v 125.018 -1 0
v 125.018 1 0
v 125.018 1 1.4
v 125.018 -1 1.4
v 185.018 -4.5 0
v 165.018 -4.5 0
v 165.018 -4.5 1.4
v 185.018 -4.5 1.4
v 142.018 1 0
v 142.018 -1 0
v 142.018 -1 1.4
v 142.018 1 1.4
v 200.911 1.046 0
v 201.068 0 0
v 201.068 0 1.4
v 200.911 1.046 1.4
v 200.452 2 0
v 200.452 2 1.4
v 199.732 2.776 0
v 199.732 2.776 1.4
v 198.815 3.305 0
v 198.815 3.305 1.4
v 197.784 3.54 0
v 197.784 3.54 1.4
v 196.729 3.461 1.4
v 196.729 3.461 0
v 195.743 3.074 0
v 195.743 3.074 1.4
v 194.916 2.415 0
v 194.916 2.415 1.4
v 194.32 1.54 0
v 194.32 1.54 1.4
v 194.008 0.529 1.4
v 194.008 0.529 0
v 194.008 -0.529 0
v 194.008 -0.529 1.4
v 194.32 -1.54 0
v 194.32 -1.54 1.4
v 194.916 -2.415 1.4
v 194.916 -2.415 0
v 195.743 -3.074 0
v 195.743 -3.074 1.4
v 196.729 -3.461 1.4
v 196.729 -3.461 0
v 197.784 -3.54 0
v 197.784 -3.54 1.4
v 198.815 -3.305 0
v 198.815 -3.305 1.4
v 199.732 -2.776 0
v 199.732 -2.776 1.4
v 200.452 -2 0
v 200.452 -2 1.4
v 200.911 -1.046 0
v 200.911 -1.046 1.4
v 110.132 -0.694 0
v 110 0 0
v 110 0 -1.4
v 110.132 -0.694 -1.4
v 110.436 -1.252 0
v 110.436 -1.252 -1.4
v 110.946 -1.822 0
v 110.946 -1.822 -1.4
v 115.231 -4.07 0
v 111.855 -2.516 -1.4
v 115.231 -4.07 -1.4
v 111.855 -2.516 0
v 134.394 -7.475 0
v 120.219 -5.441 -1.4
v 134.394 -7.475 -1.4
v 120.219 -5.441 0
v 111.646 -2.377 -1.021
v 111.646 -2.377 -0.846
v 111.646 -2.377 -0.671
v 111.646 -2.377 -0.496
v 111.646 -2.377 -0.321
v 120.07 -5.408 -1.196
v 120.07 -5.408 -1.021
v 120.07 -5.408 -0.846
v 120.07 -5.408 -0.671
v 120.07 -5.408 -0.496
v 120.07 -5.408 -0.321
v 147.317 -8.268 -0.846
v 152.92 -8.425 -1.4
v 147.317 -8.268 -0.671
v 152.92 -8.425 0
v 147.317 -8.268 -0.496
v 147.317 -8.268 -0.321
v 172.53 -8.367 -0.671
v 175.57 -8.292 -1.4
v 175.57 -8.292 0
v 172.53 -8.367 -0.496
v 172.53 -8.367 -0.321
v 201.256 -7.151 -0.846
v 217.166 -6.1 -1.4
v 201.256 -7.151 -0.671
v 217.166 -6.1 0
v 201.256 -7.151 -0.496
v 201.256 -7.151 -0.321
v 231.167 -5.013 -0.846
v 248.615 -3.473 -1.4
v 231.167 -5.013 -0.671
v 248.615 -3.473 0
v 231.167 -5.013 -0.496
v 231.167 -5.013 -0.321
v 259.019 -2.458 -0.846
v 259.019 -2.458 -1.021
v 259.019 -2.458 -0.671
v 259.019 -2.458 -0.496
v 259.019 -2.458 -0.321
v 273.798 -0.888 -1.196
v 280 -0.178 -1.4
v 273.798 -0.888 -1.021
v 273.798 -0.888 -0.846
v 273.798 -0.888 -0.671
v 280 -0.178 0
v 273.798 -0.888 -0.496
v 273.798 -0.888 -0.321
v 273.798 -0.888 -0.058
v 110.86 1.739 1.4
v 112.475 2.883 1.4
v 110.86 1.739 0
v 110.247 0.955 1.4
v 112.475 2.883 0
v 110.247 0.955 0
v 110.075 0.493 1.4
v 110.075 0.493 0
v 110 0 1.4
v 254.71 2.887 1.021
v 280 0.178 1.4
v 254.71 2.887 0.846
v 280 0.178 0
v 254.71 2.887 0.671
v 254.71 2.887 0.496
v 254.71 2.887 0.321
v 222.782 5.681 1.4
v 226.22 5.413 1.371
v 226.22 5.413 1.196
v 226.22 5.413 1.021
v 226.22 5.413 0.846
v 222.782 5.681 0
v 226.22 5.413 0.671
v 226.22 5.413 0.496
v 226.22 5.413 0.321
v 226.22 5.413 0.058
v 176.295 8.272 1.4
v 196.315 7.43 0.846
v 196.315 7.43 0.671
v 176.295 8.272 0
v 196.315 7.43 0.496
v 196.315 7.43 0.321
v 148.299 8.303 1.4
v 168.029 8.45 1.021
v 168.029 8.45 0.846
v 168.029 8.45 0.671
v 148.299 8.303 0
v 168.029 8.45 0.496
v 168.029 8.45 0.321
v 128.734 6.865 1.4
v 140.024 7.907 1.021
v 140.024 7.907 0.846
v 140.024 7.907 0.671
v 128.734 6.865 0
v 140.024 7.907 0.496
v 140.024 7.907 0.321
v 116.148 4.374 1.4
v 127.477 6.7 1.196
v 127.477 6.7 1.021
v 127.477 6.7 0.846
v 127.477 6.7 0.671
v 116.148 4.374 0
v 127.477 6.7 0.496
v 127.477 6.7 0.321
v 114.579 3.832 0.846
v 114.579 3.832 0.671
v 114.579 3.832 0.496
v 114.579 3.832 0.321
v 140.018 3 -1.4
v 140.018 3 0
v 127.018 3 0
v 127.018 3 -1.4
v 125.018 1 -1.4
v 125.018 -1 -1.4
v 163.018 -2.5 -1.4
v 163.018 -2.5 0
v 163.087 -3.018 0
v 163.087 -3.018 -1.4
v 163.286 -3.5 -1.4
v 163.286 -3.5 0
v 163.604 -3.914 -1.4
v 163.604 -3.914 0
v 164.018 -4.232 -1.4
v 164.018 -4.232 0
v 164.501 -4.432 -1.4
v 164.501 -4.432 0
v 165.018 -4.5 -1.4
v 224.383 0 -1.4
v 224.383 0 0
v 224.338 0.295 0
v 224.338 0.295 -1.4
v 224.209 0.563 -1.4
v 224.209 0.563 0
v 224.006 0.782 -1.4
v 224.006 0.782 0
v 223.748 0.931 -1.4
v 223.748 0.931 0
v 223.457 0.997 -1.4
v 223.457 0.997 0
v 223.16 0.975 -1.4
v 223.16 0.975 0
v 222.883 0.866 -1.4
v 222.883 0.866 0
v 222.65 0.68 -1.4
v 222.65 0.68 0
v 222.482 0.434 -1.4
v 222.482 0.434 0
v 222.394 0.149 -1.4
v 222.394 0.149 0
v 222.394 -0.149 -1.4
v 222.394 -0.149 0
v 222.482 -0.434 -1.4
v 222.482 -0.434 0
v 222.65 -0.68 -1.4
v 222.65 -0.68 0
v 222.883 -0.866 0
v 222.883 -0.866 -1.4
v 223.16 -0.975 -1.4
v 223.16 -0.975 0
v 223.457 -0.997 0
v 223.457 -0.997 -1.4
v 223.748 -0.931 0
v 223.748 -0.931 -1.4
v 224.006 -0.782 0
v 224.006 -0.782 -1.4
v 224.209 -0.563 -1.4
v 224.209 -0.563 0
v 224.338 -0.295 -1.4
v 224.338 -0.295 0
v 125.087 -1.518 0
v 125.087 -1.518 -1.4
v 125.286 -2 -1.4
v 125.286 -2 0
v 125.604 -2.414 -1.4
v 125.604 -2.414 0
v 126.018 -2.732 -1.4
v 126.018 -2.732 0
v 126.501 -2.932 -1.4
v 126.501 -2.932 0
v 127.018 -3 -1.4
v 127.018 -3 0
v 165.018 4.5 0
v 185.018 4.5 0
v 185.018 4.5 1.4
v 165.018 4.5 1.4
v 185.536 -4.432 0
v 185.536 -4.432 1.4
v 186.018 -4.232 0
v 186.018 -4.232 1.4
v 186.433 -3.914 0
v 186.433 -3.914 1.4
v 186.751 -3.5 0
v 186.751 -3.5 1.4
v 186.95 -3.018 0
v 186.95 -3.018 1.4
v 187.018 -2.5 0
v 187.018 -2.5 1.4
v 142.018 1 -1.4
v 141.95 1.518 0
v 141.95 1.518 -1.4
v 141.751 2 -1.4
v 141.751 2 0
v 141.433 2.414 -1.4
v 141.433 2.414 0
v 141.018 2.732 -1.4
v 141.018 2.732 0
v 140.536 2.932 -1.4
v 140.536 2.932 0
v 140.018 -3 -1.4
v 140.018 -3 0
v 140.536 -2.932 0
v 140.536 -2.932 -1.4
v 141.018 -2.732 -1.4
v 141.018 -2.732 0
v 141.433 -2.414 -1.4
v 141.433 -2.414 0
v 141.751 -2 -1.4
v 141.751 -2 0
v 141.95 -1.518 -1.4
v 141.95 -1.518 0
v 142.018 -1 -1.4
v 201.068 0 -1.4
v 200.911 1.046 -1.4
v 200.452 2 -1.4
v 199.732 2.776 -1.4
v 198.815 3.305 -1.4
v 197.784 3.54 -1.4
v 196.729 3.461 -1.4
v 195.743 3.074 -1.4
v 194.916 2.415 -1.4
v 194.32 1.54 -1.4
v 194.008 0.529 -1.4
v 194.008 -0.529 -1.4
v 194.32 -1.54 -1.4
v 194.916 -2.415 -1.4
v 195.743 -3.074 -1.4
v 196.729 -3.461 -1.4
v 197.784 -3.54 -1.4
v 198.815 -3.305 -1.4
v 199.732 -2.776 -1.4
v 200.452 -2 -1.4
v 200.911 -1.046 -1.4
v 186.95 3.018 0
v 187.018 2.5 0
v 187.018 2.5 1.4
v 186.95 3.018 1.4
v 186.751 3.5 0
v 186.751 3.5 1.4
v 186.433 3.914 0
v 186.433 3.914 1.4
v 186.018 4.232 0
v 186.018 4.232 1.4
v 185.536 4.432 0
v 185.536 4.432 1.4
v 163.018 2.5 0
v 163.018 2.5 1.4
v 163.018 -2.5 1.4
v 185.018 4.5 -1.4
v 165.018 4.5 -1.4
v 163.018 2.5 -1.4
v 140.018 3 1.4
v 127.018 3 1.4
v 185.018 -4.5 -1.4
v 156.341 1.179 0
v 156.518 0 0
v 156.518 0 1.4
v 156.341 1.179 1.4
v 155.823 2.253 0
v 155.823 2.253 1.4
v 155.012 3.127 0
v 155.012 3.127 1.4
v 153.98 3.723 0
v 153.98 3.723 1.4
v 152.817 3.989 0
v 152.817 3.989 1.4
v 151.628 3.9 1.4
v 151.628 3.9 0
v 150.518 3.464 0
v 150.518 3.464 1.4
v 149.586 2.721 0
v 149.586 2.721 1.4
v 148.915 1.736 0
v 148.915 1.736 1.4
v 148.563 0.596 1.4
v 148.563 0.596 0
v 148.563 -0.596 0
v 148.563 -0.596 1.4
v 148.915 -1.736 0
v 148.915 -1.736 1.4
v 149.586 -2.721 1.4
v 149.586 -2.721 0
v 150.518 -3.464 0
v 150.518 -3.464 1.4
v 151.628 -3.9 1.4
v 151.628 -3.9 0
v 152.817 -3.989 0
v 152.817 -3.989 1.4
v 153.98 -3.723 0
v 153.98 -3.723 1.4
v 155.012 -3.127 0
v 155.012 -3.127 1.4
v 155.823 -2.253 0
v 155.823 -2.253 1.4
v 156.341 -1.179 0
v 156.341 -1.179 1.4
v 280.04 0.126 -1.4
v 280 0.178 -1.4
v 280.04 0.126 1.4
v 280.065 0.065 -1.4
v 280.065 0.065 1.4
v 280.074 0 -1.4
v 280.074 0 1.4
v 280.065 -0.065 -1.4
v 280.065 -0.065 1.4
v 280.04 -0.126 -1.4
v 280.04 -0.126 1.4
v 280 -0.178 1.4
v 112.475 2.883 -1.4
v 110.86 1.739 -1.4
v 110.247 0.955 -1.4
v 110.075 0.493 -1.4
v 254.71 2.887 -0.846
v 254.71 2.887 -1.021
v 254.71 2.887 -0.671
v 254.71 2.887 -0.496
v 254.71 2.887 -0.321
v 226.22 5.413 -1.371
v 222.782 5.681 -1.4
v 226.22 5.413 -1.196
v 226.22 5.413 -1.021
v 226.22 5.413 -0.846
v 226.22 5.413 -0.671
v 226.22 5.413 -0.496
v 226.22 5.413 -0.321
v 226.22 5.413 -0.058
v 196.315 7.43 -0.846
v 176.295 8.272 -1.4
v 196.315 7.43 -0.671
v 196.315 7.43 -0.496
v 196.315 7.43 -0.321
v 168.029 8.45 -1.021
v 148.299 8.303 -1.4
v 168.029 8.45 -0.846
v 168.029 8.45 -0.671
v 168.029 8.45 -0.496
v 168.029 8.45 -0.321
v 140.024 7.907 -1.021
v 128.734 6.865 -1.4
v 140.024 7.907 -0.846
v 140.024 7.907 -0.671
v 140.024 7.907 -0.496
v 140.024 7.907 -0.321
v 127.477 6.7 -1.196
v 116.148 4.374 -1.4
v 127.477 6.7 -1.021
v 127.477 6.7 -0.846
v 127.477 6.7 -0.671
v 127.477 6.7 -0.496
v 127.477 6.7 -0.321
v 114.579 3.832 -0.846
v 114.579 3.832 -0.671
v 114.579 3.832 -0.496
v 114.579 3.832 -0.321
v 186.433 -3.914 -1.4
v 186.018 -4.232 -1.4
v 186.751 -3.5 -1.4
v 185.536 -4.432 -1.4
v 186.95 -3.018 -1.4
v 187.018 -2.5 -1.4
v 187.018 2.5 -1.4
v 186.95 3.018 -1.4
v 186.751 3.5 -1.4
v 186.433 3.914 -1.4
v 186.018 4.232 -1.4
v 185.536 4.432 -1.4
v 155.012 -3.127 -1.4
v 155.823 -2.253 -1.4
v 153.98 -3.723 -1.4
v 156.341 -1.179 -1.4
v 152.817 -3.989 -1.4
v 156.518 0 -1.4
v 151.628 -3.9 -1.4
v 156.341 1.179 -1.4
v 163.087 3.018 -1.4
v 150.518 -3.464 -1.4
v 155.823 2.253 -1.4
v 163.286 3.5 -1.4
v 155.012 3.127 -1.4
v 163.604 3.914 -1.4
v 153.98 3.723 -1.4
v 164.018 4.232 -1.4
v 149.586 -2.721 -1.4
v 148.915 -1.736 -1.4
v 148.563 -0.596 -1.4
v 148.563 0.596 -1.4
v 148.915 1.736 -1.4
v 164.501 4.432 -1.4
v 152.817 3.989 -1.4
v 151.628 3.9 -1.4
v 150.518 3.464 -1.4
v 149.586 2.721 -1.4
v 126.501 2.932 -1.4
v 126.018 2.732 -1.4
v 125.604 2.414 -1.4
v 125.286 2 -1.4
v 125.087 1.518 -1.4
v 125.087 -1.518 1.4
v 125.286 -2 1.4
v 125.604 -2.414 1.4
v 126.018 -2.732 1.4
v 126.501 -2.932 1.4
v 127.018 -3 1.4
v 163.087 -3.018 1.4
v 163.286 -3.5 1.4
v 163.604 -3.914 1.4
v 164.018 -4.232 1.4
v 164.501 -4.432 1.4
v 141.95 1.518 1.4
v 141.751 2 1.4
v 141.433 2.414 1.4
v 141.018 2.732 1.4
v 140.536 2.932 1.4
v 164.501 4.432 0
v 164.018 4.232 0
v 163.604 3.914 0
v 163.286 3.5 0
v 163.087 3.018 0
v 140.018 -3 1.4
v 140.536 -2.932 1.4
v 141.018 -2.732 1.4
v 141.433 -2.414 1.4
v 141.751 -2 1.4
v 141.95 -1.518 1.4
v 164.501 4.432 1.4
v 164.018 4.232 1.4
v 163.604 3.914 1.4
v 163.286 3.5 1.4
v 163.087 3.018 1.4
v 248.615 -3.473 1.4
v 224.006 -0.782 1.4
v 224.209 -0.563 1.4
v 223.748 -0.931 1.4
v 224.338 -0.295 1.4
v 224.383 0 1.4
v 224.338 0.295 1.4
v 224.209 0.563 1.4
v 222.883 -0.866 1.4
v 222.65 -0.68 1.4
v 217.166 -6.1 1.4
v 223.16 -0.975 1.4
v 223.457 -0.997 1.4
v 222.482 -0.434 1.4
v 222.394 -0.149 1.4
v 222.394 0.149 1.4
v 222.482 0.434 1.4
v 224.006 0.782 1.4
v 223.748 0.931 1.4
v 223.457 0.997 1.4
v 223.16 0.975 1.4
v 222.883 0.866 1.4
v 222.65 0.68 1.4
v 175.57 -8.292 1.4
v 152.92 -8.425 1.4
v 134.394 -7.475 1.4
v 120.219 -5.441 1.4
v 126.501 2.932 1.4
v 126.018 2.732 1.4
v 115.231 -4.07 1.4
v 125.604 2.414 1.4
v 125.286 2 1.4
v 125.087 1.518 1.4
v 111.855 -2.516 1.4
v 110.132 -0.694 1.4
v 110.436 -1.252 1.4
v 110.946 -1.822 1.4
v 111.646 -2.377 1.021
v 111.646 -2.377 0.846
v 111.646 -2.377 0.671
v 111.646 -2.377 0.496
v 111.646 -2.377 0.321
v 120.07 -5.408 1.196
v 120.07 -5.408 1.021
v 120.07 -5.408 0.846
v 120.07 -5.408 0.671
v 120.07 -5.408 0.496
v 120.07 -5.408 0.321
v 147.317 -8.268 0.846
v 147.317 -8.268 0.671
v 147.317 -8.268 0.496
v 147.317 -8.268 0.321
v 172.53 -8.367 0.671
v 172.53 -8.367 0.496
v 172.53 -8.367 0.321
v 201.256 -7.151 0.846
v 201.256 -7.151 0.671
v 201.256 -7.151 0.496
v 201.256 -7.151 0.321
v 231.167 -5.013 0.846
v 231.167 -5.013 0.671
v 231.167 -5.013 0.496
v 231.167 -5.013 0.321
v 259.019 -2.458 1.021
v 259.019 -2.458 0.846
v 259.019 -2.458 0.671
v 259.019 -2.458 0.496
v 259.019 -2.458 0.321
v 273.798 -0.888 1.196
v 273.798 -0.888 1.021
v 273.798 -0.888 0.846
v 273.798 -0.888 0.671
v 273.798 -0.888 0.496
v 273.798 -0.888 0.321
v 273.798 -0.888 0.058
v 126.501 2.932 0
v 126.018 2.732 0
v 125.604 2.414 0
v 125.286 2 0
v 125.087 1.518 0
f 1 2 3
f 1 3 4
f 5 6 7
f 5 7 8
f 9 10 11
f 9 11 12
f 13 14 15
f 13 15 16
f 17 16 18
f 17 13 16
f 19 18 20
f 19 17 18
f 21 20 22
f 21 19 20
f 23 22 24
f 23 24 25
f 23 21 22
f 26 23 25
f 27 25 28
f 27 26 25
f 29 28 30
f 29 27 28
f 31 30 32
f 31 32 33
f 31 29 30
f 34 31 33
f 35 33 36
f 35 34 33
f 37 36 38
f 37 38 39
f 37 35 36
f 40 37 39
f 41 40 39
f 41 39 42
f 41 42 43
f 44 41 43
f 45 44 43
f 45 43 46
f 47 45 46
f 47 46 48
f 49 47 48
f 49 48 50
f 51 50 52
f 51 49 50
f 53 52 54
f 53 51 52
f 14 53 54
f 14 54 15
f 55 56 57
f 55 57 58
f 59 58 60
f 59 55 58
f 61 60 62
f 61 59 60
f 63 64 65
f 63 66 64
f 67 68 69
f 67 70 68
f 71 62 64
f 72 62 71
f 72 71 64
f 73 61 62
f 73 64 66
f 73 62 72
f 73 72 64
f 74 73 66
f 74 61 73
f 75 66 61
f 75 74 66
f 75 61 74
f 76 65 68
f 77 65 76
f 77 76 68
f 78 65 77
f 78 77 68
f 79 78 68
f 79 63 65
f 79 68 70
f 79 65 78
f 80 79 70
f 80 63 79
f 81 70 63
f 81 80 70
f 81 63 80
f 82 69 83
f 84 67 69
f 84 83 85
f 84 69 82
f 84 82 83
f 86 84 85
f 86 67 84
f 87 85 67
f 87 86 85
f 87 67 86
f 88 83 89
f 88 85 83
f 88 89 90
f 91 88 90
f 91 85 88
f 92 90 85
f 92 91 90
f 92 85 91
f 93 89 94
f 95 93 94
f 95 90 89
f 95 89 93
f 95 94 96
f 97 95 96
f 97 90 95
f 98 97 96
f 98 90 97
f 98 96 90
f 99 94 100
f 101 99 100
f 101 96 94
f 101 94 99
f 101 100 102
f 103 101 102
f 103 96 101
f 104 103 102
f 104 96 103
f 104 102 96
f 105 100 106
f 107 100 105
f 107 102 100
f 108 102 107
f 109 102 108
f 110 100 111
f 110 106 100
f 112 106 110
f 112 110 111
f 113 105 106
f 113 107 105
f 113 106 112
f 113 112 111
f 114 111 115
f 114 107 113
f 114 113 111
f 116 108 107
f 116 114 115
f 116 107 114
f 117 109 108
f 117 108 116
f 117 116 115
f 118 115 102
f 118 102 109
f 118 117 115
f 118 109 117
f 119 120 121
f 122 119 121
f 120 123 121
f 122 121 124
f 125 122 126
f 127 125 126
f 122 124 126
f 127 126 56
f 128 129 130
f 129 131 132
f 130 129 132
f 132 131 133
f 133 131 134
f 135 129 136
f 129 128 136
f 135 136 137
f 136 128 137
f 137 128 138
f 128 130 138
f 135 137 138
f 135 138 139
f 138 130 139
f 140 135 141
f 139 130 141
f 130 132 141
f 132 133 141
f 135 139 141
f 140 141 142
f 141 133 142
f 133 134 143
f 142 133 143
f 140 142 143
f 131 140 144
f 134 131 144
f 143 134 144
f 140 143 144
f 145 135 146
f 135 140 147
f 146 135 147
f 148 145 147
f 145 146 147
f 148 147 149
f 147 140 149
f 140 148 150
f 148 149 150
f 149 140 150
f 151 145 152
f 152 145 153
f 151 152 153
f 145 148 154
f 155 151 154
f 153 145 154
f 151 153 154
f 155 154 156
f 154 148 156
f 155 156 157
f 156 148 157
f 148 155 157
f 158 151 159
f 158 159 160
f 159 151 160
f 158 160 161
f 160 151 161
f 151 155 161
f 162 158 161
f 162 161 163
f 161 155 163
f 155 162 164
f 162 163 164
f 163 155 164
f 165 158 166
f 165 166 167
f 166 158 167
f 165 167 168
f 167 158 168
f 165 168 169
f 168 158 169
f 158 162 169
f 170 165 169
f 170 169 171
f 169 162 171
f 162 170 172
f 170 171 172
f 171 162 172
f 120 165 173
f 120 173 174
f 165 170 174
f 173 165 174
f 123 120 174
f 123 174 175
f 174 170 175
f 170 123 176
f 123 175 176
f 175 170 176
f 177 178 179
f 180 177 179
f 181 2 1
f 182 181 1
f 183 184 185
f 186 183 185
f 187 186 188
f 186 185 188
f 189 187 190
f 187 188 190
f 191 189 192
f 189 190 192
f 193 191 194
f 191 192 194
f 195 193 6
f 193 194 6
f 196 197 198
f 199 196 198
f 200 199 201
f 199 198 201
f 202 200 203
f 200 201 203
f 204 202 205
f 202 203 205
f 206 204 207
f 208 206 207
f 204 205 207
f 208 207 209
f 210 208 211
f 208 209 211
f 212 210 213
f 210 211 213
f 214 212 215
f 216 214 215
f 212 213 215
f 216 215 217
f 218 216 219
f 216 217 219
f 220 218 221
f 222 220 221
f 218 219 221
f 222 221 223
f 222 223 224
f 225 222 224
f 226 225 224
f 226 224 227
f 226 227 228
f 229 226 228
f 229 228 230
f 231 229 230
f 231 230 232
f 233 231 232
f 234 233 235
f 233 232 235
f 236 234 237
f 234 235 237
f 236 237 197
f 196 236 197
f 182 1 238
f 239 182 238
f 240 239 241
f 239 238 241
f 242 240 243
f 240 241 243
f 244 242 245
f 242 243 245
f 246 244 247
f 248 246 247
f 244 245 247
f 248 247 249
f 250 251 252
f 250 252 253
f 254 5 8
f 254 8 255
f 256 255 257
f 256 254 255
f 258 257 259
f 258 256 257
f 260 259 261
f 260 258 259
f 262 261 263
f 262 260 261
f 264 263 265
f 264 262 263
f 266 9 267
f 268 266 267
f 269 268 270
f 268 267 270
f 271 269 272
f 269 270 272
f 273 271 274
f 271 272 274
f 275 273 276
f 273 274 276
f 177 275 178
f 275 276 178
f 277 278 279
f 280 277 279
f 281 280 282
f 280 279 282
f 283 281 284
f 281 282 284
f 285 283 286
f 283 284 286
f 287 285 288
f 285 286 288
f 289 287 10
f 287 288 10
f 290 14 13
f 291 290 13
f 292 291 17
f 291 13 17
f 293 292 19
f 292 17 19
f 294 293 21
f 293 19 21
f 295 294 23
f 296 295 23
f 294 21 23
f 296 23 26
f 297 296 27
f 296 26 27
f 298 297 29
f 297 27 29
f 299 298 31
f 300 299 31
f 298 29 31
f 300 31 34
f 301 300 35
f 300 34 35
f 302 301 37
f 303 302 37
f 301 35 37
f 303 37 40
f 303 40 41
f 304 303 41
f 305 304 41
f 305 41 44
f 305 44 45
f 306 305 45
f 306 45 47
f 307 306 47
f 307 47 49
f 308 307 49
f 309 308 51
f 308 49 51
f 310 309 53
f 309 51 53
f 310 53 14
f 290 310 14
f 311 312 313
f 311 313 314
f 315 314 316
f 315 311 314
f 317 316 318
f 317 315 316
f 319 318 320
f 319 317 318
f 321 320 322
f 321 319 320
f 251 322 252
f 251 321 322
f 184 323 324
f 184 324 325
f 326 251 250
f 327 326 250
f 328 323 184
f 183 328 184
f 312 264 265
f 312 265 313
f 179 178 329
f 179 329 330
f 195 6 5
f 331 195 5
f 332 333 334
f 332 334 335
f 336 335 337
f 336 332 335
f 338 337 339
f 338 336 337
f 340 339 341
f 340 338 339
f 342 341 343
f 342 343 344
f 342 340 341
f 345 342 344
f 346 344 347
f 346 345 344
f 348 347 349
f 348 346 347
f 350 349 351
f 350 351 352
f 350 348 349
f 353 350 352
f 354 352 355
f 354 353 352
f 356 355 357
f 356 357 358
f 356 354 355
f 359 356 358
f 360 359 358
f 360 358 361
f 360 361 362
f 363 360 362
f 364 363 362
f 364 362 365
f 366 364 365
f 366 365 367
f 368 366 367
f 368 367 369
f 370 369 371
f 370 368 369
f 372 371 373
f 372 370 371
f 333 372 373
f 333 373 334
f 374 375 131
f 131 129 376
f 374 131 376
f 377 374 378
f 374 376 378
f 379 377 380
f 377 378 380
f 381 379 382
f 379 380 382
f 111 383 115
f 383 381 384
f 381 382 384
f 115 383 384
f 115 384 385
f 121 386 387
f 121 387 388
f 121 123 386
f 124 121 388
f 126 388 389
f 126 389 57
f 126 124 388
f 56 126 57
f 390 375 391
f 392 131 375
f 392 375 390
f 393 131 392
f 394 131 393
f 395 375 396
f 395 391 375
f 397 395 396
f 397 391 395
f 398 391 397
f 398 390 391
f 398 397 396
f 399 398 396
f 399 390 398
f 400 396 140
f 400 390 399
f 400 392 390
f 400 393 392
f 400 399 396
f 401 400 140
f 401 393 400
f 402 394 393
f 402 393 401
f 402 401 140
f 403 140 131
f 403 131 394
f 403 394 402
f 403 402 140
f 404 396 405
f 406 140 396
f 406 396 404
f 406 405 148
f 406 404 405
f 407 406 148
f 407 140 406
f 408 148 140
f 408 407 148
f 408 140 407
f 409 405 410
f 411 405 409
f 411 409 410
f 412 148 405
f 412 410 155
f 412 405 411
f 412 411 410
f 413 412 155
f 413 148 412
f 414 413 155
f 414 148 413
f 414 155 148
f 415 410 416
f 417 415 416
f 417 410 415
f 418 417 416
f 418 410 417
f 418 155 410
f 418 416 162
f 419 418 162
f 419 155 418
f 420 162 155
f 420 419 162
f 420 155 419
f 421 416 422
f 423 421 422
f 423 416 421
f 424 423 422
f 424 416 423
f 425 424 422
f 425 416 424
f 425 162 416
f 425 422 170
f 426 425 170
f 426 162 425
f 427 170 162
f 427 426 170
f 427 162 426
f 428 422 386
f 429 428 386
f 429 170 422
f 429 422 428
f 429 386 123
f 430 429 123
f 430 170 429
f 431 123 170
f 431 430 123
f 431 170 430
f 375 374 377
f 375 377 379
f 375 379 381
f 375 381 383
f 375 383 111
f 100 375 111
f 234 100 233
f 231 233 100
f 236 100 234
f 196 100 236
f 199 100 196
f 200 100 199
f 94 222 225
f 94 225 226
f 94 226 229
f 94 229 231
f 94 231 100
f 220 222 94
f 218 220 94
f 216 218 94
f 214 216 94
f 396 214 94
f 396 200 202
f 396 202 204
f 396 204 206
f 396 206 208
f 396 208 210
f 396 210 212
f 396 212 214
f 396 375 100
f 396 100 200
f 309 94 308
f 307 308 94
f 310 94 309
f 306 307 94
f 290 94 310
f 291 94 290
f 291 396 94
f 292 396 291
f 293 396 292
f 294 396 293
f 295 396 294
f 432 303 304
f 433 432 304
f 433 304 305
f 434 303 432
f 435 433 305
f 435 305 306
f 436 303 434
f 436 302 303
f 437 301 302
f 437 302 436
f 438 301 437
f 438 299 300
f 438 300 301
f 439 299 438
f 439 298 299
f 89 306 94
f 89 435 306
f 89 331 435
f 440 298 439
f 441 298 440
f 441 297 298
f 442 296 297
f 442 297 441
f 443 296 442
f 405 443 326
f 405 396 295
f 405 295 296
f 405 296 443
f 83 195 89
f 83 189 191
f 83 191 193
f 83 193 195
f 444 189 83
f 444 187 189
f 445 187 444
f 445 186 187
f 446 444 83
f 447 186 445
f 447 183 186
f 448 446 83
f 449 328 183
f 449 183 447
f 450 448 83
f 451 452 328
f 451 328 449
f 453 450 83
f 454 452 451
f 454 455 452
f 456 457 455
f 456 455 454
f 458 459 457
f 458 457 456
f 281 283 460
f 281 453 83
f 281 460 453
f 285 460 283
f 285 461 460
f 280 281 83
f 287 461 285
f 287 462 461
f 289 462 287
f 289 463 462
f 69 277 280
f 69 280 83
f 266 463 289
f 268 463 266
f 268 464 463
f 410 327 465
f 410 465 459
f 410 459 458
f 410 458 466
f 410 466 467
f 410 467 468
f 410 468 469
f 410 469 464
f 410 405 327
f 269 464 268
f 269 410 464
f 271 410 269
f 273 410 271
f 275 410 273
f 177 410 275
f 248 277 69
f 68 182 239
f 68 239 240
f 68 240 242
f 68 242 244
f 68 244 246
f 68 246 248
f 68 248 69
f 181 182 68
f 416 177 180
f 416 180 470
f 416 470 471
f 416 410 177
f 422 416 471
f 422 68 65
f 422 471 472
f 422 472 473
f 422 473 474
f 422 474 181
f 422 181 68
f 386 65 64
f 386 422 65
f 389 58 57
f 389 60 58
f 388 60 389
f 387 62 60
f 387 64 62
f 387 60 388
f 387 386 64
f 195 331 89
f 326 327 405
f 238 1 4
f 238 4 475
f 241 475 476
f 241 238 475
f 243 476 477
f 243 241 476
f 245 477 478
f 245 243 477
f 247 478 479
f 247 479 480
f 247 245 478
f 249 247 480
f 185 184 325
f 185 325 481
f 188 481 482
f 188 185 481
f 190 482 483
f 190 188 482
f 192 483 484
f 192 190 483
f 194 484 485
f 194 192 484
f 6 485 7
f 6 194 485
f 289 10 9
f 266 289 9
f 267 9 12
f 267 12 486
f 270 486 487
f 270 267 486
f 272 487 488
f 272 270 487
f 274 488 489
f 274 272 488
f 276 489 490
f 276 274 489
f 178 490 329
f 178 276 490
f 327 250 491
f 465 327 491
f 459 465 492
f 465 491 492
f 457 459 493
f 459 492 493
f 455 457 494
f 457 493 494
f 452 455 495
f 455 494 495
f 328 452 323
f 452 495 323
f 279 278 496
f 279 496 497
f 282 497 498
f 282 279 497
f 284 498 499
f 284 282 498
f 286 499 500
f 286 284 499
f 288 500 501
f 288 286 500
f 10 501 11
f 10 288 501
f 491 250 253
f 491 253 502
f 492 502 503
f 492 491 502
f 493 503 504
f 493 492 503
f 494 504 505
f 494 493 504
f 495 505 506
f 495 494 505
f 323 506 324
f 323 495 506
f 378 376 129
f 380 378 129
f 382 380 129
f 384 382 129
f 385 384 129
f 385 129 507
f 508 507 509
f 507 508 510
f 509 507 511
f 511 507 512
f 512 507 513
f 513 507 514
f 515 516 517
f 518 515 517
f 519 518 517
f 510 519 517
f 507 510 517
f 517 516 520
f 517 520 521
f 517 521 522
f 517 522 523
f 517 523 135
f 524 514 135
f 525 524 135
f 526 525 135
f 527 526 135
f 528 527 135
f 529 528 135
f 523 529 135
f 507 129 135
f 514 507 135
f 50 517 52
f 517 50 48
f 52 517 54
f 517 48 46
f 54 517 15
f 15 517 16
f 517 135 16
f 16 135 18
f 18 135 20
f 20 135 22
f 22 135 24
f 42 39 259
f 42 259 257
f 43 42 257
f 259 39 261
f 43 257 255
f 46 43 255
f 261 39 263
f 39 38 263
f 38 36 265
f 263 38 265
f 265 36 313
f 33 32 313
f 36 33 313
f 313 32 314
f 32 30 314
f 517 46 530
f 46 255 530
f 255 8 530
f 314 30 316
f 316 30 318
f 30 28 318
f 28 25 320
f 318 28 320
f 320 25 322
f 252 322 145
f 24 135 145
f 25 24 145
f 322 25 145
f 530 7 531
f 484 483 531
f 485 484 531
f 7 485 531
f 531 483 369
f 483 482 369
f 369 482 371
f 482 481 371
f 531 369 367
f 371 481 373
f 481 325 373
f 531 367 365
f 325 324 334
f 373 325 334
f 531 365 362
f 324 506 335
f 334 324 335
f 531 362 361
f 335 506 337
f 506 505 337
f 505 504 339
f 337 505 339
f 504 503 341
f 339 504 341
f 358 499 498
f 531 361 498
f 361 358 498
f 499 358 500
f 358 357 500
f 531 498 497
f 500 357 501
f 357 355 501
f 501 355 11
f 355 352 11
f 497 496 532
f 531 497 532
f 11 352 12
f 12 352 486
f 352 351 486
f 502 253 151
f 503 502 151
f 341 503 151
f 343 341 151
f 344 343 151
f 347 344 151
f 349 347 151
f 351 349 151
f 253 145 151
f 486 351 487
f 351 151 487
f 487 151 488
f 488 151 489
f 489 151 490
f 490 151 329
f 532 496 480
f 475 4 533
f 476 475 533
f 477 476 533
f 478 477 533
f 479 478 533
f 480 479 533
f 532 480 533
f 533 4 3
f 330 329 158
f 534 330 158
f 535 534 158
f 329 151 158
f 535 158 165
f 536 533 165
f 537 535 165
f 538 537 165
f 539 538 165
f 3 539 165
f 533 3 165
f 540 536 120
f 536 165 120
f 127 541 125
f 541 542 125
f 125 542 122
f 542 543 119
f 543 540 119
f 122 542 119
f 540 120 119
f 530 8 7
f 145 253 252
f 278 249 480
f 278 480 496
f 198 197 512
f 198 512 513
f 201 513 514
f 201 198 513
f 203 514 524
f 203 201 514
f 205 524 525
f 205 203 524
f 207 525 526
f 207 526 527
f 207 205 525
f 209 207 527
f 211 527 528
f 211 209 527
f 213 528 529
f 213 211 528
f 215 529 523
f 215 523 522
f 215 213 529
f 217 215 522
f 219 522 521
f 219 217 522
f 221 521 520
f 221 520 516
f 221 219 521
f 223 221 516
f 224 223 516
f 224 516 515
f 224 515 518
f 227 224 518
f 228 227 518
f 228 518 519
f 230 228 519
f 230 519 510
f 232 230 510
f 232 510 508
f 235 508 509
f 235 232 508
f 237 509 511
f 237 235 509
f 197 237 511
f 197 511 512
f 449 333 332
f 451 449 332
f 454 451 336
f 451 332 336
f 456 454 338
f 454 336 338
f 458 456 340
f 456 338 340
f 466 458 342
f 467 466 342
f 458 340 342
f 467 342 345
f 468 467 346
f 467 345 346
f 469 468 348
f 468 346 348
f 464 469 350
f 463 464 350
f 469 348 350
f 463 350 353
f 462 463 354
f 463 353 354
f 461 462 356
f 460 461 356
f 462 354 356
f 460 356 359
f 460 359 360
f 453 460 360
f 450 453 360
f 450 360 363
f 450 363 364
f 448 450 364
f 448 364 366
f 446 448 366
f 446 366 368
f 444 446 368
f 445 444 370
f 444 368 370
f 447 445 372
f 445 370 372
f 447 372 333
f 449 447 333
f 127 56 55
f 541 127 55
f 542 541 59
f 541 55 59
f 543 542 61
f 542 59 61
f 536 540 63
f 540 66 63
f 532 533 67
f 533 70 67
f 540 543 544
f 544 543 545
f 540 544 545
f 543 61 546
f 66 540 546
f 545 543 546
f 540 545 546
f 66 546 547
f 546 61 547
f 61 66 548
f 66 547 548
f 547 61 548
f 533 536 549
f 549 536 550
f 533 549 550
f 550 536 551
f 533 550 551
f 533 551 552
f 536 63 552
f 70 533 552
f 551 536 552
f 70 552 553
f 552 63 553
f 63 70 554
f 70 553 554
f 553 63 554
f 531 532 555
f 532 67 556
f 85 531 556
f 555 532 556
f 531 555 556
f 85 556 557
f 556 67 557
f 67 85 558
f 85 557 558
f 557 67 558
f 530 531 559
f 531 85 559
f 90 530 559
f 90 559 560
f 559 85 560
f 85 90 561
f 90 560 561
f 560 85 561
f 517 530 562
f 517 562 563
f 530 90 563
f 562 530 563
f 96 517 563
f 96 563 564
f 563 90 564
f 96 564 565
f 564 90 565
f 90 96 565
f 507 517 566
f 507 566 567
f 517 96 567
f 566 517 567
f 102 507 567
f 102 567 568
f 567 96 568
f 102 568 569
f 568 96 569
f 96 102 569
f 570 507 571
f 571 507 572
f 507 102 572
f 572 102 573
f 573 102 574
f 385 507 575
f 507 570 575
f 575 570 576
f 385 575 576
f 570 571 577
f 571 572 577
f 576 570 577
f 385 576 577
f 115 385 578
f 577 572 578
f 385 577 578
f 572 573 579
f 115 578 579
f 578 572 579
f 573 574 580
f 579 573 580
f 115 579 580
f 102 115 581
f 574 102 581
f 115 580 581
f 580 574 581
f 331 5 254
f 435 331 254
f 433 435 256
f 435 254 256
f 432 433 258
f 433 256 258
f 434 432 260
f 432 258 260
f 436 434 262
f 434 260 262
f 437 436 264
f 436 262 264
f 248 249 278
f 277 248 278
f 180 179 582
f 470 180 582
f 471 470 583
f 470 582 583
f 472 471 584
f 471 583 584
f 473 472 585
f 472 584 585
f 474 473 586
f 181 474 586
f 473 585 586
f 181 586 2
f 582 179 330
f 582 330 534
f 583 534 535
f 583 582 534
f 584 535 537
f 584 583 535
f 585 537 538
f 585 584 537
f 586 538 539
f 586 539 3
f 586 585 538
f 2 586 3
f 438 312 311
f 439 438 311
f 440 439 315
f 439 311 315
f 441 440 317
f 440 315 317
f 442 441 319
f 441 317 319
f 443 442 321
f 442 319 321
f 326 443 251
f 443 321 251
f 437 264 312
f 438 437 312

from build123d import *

# Parameters (mm, degrees)
SKETCH_1_R      = 4
SKETCH_1_R_2    = 3.55
SKETCH_1_R_3    = 1
EXTRUDE_1_DEPTH = 1.4


with BuildPart() as part:
    # Эскиз1 → Бобышка-Вытянуть1 (new, symmetric)
    with BuildSketch(Plane.XY):
        with BuildLine():
            ThreePointArc((280, 0.1785), (280.073937121, 0), (280, -0.1785))
            add(Edge.make_bspline(
                [(110, 0), (110.027578176, -0.23672144), (110.085538218, -0.73423022), (110.530223642, -1.427069758), (111.196336341, -2.078555233), (112.109835923, -2.701306388), (113.256788366, -3.299309238), (114.63793972, -3.873060466), (116.247665798, -4.421392386), (118.081312133, -4.942567641), (120.133109351, -5.434797476), (122.397158974, -5.896120566), (124.867245825, -6.324666077), (127.536961089, -6.718650341), (130.399721686, -7.07642431), (133.448762895, -7.396480569), (136.677139412, -7.677604542), (140.077743555, -7.918678943), (143.643266298, -8.118975561), (147.366223919, -8.277985977), (151.238917925, -8.395506076), (155.253439756, -8.471528808), (159.401643404, -8.506522967), (163.675147454, -8.5010027), (168.065295924, -8.455953662), (172.563150272, -8.372486564), (177.159453511, -8.251957682), (181.844626933, -8.095958493), (186.608700127, -7.906218293), (191.441311474, -7.684604439), (196.331634567, -7.433105337), (201.268368917, -7.153826886), (206.239642946, -6.848873), (211.232977593, -6.52047435), (216.235178286, -6.170864577), (221.232257467, -5.802244475), (226.209311114, -5.416958265), (231.150377303, -5.017351103), (236.038226964, -4.605811749), (240.854179313, -4.184912649), (247.071089236, -3.62220531), (253.116111921, -3.047869044), (258.952644662, -2.467188138), (263.047743378, -2.047856604), (266.898988862, -1.642607304), (270.455833183, -1.258590905), (273.651166984, -0.905304265), (276.385426802, -0.596436482), (278.45259621, -0.358958361), (279.592043704, -0.226075898), (280, -0.1785)],
                knots=[0, 0, 0, 0, 0.004099011, 0.008614742, 0.013934855, 0.020277775, 0.027752981, 0.036410215, 0.046266433, 0.057320238, 0.069558946, 0.082962861, 0.097507218, 0.113164082, 0.12990269, 0.147690304, 0.166492185, 0.186271967, 0.206991861, 0.228612215, 0.251092165, 0.274388983, 0.298458209, 0.323253842, 0.348727971, 0.374830387, 0.40150919, 0.428710016, 0.456376154, 0.484448083, 0.512863887, 0.541558094, 0.570462313, 0.599504248, 0.628607349, 0.657690446, 0.686667237, 0.715444849, 0.743923546, 0.77199483, 0.799540253, 0.852512115, 0.877624446, 0.901571134, 0.924121062, 0.944988816, 0.963803939, 0.980044339, 0.992855276, 1, 1, 1, 1], degree=3))
            add(Edge.make_bspline(
                [(280, 0.1785), (279.592043704, 0.226075898), (278.45259621, 0.358958361), (276.385426802, 0.596436482), (273.651166984, 0.905304265), (270.455833183, 1.258590905), (266.898988862, 1.642607304), (263.047743378, 2.047856604), (258.952644662, 2.467188138), (253.116111921, 3.047869044), (247.071089236, 3.62220531), (240.854179313, 4.184912649), (236.038226964, 4.605811749), (231.150377303, 5.017351103), (226.209311114, 5.416958265), (221.232257467, 5.802244475), (216.235178286, 6.170864577), (211.232977593, 6.52047435), (206.239642946, 6.848873), (201.268368917, 7.153826886), (196.331634567, 7.433105337), (191.441311474, 7.684604439), (186.608700127, 7.906218293), (181.844626933, 8.095958493), (177.159453511, 8.251957682), (172.563150272, 8.372486564), (168.065295924, 8.455953662), (163.675147454, 8.5010027), (159.401643404, 8.506522967), (155.253439756, 8.471528808), (151.238917925, 8.395506076), (147.366223919, 8.277985977), (143.643266298, 8.118975561), (140.077743555, 7.918678943), (136.677139412, 7.677604542), (133.448762895, 7.396480569), (130.399721686, 7.07642431), (127.536961089, 6.718650341), (124.867245825, 6.324666077), (122.397158974, 5.896120566), (120.133109351, 5.434797476), (118.081312133, 4.942567641), (116.247665798, 4.421392386), (114.63793972, 3.873060466), (113.256788366, 3.299309238), (112.109835923, 2.701306388), (111.196336341, 2.078555233), (110.530223642, 1.427069758), (110.085538218, 0.73423022), (110.027578176, 0.23672144), (110, 0)],
                knots=[0, 0, 0, 0, 0.007144724, 0.019955661, 0.036196061, 0.055011184, 0.075878938, 0.098428866, 0.122375554, 0.147487885, 0.200459747, 0.22800517, 0.256076454, 0.284555151, 0.313332763, 0.342309554, 0.371392651, 0.400495752, 0.429537687, 0.458441906, 0.487136113, 0.515551917, 0.543623846, 0.571289984, 0.59849081, 0.625169613, 0.651272029, 0.676746158, 0.701541791, 0.725611017, 0.748907835, 0.771387785, 0.793008139, 0.813728033, 0.833507815, 0.852309696, 0.87009731, 0.886835918, 0.902492782, 0.917037139, 0.930441054, 0.942679762, 0.953733567, 0.963589785, 0.972247019, 0.979722225, 0.986065145, 0.991385258, 0.995900989, 1, 1, 1, 1], degree=3))
        make_face()
        with Locations((152.51848428, 0)):
            Circle(SKETCH_1_R, mode=Mode.SUBTRACT)
        with Locations((197.51848428, 0)):
            Circle(SKETCH_1_R_2, mode=Mode.SUBTRACT)
        with Locations((223.382624747, 0)):
            Circle(SKETCH_1_R_3, mode=Mode.SUBTRACT)
        with BuildLine():
            Line((127.01848428, -3), (140.01848428, -3))
            ThreePointArc((140.01848428, -3), (141.432697843, -2.414213562), (142.01848428, -1))
            Line((142.01848428, -1), (142.01848428, 1))
            ThreePointArc((142.01848428, 1), (141.432697843, 2.414213562), (140.01848428, 3))
            Line((140.01848428, 3), (127.01848428, 3))
            ThreePointArc((127.01848428, 3), (125.604270718, 2.414213562), (125.01848428, 1))
            Line((125.01848428, 1), (125.01848428, -1))
            ThreePointArc((125.01848428, -1), (125.604270718, -2.414213562), (127.01848428, -3))
        make_face(mode=Mode.SUBTRACT)
        with BuildLine():
            Line((165.01848428, -4.5), (185.01848428, -4.5))
            ThreePointArc((185.01848428, -4.5), (186.432697843, -3.914213562), (187.01848428, -2.5))
            Line((187.01848428, -2.5), (187.01848428, 2.5))
            ThreePointArc((187.01848428, 2.5), (186.432697843, 3.914213562), (185.01848428, 4.5))
            Line((185.01848428, 4.5), (165.01848428, 4.5))
            ThreePointArc((165.01848428, 4.5), (163.604270718, 3.914213562), (163.01848428, 2.5))
            Line((163.01848428, 2.5), (163.01848428, -2.5))
            ThreePointArc((163.01848428, -2.5), (163.604270718, -3.914213562), (165.01848428, -4.5))
        make_face(mode=Mode.SUBTRACT)
    extrude(amount=EXTRUDE_1_DEPTH, both=True)


solid = part.part
